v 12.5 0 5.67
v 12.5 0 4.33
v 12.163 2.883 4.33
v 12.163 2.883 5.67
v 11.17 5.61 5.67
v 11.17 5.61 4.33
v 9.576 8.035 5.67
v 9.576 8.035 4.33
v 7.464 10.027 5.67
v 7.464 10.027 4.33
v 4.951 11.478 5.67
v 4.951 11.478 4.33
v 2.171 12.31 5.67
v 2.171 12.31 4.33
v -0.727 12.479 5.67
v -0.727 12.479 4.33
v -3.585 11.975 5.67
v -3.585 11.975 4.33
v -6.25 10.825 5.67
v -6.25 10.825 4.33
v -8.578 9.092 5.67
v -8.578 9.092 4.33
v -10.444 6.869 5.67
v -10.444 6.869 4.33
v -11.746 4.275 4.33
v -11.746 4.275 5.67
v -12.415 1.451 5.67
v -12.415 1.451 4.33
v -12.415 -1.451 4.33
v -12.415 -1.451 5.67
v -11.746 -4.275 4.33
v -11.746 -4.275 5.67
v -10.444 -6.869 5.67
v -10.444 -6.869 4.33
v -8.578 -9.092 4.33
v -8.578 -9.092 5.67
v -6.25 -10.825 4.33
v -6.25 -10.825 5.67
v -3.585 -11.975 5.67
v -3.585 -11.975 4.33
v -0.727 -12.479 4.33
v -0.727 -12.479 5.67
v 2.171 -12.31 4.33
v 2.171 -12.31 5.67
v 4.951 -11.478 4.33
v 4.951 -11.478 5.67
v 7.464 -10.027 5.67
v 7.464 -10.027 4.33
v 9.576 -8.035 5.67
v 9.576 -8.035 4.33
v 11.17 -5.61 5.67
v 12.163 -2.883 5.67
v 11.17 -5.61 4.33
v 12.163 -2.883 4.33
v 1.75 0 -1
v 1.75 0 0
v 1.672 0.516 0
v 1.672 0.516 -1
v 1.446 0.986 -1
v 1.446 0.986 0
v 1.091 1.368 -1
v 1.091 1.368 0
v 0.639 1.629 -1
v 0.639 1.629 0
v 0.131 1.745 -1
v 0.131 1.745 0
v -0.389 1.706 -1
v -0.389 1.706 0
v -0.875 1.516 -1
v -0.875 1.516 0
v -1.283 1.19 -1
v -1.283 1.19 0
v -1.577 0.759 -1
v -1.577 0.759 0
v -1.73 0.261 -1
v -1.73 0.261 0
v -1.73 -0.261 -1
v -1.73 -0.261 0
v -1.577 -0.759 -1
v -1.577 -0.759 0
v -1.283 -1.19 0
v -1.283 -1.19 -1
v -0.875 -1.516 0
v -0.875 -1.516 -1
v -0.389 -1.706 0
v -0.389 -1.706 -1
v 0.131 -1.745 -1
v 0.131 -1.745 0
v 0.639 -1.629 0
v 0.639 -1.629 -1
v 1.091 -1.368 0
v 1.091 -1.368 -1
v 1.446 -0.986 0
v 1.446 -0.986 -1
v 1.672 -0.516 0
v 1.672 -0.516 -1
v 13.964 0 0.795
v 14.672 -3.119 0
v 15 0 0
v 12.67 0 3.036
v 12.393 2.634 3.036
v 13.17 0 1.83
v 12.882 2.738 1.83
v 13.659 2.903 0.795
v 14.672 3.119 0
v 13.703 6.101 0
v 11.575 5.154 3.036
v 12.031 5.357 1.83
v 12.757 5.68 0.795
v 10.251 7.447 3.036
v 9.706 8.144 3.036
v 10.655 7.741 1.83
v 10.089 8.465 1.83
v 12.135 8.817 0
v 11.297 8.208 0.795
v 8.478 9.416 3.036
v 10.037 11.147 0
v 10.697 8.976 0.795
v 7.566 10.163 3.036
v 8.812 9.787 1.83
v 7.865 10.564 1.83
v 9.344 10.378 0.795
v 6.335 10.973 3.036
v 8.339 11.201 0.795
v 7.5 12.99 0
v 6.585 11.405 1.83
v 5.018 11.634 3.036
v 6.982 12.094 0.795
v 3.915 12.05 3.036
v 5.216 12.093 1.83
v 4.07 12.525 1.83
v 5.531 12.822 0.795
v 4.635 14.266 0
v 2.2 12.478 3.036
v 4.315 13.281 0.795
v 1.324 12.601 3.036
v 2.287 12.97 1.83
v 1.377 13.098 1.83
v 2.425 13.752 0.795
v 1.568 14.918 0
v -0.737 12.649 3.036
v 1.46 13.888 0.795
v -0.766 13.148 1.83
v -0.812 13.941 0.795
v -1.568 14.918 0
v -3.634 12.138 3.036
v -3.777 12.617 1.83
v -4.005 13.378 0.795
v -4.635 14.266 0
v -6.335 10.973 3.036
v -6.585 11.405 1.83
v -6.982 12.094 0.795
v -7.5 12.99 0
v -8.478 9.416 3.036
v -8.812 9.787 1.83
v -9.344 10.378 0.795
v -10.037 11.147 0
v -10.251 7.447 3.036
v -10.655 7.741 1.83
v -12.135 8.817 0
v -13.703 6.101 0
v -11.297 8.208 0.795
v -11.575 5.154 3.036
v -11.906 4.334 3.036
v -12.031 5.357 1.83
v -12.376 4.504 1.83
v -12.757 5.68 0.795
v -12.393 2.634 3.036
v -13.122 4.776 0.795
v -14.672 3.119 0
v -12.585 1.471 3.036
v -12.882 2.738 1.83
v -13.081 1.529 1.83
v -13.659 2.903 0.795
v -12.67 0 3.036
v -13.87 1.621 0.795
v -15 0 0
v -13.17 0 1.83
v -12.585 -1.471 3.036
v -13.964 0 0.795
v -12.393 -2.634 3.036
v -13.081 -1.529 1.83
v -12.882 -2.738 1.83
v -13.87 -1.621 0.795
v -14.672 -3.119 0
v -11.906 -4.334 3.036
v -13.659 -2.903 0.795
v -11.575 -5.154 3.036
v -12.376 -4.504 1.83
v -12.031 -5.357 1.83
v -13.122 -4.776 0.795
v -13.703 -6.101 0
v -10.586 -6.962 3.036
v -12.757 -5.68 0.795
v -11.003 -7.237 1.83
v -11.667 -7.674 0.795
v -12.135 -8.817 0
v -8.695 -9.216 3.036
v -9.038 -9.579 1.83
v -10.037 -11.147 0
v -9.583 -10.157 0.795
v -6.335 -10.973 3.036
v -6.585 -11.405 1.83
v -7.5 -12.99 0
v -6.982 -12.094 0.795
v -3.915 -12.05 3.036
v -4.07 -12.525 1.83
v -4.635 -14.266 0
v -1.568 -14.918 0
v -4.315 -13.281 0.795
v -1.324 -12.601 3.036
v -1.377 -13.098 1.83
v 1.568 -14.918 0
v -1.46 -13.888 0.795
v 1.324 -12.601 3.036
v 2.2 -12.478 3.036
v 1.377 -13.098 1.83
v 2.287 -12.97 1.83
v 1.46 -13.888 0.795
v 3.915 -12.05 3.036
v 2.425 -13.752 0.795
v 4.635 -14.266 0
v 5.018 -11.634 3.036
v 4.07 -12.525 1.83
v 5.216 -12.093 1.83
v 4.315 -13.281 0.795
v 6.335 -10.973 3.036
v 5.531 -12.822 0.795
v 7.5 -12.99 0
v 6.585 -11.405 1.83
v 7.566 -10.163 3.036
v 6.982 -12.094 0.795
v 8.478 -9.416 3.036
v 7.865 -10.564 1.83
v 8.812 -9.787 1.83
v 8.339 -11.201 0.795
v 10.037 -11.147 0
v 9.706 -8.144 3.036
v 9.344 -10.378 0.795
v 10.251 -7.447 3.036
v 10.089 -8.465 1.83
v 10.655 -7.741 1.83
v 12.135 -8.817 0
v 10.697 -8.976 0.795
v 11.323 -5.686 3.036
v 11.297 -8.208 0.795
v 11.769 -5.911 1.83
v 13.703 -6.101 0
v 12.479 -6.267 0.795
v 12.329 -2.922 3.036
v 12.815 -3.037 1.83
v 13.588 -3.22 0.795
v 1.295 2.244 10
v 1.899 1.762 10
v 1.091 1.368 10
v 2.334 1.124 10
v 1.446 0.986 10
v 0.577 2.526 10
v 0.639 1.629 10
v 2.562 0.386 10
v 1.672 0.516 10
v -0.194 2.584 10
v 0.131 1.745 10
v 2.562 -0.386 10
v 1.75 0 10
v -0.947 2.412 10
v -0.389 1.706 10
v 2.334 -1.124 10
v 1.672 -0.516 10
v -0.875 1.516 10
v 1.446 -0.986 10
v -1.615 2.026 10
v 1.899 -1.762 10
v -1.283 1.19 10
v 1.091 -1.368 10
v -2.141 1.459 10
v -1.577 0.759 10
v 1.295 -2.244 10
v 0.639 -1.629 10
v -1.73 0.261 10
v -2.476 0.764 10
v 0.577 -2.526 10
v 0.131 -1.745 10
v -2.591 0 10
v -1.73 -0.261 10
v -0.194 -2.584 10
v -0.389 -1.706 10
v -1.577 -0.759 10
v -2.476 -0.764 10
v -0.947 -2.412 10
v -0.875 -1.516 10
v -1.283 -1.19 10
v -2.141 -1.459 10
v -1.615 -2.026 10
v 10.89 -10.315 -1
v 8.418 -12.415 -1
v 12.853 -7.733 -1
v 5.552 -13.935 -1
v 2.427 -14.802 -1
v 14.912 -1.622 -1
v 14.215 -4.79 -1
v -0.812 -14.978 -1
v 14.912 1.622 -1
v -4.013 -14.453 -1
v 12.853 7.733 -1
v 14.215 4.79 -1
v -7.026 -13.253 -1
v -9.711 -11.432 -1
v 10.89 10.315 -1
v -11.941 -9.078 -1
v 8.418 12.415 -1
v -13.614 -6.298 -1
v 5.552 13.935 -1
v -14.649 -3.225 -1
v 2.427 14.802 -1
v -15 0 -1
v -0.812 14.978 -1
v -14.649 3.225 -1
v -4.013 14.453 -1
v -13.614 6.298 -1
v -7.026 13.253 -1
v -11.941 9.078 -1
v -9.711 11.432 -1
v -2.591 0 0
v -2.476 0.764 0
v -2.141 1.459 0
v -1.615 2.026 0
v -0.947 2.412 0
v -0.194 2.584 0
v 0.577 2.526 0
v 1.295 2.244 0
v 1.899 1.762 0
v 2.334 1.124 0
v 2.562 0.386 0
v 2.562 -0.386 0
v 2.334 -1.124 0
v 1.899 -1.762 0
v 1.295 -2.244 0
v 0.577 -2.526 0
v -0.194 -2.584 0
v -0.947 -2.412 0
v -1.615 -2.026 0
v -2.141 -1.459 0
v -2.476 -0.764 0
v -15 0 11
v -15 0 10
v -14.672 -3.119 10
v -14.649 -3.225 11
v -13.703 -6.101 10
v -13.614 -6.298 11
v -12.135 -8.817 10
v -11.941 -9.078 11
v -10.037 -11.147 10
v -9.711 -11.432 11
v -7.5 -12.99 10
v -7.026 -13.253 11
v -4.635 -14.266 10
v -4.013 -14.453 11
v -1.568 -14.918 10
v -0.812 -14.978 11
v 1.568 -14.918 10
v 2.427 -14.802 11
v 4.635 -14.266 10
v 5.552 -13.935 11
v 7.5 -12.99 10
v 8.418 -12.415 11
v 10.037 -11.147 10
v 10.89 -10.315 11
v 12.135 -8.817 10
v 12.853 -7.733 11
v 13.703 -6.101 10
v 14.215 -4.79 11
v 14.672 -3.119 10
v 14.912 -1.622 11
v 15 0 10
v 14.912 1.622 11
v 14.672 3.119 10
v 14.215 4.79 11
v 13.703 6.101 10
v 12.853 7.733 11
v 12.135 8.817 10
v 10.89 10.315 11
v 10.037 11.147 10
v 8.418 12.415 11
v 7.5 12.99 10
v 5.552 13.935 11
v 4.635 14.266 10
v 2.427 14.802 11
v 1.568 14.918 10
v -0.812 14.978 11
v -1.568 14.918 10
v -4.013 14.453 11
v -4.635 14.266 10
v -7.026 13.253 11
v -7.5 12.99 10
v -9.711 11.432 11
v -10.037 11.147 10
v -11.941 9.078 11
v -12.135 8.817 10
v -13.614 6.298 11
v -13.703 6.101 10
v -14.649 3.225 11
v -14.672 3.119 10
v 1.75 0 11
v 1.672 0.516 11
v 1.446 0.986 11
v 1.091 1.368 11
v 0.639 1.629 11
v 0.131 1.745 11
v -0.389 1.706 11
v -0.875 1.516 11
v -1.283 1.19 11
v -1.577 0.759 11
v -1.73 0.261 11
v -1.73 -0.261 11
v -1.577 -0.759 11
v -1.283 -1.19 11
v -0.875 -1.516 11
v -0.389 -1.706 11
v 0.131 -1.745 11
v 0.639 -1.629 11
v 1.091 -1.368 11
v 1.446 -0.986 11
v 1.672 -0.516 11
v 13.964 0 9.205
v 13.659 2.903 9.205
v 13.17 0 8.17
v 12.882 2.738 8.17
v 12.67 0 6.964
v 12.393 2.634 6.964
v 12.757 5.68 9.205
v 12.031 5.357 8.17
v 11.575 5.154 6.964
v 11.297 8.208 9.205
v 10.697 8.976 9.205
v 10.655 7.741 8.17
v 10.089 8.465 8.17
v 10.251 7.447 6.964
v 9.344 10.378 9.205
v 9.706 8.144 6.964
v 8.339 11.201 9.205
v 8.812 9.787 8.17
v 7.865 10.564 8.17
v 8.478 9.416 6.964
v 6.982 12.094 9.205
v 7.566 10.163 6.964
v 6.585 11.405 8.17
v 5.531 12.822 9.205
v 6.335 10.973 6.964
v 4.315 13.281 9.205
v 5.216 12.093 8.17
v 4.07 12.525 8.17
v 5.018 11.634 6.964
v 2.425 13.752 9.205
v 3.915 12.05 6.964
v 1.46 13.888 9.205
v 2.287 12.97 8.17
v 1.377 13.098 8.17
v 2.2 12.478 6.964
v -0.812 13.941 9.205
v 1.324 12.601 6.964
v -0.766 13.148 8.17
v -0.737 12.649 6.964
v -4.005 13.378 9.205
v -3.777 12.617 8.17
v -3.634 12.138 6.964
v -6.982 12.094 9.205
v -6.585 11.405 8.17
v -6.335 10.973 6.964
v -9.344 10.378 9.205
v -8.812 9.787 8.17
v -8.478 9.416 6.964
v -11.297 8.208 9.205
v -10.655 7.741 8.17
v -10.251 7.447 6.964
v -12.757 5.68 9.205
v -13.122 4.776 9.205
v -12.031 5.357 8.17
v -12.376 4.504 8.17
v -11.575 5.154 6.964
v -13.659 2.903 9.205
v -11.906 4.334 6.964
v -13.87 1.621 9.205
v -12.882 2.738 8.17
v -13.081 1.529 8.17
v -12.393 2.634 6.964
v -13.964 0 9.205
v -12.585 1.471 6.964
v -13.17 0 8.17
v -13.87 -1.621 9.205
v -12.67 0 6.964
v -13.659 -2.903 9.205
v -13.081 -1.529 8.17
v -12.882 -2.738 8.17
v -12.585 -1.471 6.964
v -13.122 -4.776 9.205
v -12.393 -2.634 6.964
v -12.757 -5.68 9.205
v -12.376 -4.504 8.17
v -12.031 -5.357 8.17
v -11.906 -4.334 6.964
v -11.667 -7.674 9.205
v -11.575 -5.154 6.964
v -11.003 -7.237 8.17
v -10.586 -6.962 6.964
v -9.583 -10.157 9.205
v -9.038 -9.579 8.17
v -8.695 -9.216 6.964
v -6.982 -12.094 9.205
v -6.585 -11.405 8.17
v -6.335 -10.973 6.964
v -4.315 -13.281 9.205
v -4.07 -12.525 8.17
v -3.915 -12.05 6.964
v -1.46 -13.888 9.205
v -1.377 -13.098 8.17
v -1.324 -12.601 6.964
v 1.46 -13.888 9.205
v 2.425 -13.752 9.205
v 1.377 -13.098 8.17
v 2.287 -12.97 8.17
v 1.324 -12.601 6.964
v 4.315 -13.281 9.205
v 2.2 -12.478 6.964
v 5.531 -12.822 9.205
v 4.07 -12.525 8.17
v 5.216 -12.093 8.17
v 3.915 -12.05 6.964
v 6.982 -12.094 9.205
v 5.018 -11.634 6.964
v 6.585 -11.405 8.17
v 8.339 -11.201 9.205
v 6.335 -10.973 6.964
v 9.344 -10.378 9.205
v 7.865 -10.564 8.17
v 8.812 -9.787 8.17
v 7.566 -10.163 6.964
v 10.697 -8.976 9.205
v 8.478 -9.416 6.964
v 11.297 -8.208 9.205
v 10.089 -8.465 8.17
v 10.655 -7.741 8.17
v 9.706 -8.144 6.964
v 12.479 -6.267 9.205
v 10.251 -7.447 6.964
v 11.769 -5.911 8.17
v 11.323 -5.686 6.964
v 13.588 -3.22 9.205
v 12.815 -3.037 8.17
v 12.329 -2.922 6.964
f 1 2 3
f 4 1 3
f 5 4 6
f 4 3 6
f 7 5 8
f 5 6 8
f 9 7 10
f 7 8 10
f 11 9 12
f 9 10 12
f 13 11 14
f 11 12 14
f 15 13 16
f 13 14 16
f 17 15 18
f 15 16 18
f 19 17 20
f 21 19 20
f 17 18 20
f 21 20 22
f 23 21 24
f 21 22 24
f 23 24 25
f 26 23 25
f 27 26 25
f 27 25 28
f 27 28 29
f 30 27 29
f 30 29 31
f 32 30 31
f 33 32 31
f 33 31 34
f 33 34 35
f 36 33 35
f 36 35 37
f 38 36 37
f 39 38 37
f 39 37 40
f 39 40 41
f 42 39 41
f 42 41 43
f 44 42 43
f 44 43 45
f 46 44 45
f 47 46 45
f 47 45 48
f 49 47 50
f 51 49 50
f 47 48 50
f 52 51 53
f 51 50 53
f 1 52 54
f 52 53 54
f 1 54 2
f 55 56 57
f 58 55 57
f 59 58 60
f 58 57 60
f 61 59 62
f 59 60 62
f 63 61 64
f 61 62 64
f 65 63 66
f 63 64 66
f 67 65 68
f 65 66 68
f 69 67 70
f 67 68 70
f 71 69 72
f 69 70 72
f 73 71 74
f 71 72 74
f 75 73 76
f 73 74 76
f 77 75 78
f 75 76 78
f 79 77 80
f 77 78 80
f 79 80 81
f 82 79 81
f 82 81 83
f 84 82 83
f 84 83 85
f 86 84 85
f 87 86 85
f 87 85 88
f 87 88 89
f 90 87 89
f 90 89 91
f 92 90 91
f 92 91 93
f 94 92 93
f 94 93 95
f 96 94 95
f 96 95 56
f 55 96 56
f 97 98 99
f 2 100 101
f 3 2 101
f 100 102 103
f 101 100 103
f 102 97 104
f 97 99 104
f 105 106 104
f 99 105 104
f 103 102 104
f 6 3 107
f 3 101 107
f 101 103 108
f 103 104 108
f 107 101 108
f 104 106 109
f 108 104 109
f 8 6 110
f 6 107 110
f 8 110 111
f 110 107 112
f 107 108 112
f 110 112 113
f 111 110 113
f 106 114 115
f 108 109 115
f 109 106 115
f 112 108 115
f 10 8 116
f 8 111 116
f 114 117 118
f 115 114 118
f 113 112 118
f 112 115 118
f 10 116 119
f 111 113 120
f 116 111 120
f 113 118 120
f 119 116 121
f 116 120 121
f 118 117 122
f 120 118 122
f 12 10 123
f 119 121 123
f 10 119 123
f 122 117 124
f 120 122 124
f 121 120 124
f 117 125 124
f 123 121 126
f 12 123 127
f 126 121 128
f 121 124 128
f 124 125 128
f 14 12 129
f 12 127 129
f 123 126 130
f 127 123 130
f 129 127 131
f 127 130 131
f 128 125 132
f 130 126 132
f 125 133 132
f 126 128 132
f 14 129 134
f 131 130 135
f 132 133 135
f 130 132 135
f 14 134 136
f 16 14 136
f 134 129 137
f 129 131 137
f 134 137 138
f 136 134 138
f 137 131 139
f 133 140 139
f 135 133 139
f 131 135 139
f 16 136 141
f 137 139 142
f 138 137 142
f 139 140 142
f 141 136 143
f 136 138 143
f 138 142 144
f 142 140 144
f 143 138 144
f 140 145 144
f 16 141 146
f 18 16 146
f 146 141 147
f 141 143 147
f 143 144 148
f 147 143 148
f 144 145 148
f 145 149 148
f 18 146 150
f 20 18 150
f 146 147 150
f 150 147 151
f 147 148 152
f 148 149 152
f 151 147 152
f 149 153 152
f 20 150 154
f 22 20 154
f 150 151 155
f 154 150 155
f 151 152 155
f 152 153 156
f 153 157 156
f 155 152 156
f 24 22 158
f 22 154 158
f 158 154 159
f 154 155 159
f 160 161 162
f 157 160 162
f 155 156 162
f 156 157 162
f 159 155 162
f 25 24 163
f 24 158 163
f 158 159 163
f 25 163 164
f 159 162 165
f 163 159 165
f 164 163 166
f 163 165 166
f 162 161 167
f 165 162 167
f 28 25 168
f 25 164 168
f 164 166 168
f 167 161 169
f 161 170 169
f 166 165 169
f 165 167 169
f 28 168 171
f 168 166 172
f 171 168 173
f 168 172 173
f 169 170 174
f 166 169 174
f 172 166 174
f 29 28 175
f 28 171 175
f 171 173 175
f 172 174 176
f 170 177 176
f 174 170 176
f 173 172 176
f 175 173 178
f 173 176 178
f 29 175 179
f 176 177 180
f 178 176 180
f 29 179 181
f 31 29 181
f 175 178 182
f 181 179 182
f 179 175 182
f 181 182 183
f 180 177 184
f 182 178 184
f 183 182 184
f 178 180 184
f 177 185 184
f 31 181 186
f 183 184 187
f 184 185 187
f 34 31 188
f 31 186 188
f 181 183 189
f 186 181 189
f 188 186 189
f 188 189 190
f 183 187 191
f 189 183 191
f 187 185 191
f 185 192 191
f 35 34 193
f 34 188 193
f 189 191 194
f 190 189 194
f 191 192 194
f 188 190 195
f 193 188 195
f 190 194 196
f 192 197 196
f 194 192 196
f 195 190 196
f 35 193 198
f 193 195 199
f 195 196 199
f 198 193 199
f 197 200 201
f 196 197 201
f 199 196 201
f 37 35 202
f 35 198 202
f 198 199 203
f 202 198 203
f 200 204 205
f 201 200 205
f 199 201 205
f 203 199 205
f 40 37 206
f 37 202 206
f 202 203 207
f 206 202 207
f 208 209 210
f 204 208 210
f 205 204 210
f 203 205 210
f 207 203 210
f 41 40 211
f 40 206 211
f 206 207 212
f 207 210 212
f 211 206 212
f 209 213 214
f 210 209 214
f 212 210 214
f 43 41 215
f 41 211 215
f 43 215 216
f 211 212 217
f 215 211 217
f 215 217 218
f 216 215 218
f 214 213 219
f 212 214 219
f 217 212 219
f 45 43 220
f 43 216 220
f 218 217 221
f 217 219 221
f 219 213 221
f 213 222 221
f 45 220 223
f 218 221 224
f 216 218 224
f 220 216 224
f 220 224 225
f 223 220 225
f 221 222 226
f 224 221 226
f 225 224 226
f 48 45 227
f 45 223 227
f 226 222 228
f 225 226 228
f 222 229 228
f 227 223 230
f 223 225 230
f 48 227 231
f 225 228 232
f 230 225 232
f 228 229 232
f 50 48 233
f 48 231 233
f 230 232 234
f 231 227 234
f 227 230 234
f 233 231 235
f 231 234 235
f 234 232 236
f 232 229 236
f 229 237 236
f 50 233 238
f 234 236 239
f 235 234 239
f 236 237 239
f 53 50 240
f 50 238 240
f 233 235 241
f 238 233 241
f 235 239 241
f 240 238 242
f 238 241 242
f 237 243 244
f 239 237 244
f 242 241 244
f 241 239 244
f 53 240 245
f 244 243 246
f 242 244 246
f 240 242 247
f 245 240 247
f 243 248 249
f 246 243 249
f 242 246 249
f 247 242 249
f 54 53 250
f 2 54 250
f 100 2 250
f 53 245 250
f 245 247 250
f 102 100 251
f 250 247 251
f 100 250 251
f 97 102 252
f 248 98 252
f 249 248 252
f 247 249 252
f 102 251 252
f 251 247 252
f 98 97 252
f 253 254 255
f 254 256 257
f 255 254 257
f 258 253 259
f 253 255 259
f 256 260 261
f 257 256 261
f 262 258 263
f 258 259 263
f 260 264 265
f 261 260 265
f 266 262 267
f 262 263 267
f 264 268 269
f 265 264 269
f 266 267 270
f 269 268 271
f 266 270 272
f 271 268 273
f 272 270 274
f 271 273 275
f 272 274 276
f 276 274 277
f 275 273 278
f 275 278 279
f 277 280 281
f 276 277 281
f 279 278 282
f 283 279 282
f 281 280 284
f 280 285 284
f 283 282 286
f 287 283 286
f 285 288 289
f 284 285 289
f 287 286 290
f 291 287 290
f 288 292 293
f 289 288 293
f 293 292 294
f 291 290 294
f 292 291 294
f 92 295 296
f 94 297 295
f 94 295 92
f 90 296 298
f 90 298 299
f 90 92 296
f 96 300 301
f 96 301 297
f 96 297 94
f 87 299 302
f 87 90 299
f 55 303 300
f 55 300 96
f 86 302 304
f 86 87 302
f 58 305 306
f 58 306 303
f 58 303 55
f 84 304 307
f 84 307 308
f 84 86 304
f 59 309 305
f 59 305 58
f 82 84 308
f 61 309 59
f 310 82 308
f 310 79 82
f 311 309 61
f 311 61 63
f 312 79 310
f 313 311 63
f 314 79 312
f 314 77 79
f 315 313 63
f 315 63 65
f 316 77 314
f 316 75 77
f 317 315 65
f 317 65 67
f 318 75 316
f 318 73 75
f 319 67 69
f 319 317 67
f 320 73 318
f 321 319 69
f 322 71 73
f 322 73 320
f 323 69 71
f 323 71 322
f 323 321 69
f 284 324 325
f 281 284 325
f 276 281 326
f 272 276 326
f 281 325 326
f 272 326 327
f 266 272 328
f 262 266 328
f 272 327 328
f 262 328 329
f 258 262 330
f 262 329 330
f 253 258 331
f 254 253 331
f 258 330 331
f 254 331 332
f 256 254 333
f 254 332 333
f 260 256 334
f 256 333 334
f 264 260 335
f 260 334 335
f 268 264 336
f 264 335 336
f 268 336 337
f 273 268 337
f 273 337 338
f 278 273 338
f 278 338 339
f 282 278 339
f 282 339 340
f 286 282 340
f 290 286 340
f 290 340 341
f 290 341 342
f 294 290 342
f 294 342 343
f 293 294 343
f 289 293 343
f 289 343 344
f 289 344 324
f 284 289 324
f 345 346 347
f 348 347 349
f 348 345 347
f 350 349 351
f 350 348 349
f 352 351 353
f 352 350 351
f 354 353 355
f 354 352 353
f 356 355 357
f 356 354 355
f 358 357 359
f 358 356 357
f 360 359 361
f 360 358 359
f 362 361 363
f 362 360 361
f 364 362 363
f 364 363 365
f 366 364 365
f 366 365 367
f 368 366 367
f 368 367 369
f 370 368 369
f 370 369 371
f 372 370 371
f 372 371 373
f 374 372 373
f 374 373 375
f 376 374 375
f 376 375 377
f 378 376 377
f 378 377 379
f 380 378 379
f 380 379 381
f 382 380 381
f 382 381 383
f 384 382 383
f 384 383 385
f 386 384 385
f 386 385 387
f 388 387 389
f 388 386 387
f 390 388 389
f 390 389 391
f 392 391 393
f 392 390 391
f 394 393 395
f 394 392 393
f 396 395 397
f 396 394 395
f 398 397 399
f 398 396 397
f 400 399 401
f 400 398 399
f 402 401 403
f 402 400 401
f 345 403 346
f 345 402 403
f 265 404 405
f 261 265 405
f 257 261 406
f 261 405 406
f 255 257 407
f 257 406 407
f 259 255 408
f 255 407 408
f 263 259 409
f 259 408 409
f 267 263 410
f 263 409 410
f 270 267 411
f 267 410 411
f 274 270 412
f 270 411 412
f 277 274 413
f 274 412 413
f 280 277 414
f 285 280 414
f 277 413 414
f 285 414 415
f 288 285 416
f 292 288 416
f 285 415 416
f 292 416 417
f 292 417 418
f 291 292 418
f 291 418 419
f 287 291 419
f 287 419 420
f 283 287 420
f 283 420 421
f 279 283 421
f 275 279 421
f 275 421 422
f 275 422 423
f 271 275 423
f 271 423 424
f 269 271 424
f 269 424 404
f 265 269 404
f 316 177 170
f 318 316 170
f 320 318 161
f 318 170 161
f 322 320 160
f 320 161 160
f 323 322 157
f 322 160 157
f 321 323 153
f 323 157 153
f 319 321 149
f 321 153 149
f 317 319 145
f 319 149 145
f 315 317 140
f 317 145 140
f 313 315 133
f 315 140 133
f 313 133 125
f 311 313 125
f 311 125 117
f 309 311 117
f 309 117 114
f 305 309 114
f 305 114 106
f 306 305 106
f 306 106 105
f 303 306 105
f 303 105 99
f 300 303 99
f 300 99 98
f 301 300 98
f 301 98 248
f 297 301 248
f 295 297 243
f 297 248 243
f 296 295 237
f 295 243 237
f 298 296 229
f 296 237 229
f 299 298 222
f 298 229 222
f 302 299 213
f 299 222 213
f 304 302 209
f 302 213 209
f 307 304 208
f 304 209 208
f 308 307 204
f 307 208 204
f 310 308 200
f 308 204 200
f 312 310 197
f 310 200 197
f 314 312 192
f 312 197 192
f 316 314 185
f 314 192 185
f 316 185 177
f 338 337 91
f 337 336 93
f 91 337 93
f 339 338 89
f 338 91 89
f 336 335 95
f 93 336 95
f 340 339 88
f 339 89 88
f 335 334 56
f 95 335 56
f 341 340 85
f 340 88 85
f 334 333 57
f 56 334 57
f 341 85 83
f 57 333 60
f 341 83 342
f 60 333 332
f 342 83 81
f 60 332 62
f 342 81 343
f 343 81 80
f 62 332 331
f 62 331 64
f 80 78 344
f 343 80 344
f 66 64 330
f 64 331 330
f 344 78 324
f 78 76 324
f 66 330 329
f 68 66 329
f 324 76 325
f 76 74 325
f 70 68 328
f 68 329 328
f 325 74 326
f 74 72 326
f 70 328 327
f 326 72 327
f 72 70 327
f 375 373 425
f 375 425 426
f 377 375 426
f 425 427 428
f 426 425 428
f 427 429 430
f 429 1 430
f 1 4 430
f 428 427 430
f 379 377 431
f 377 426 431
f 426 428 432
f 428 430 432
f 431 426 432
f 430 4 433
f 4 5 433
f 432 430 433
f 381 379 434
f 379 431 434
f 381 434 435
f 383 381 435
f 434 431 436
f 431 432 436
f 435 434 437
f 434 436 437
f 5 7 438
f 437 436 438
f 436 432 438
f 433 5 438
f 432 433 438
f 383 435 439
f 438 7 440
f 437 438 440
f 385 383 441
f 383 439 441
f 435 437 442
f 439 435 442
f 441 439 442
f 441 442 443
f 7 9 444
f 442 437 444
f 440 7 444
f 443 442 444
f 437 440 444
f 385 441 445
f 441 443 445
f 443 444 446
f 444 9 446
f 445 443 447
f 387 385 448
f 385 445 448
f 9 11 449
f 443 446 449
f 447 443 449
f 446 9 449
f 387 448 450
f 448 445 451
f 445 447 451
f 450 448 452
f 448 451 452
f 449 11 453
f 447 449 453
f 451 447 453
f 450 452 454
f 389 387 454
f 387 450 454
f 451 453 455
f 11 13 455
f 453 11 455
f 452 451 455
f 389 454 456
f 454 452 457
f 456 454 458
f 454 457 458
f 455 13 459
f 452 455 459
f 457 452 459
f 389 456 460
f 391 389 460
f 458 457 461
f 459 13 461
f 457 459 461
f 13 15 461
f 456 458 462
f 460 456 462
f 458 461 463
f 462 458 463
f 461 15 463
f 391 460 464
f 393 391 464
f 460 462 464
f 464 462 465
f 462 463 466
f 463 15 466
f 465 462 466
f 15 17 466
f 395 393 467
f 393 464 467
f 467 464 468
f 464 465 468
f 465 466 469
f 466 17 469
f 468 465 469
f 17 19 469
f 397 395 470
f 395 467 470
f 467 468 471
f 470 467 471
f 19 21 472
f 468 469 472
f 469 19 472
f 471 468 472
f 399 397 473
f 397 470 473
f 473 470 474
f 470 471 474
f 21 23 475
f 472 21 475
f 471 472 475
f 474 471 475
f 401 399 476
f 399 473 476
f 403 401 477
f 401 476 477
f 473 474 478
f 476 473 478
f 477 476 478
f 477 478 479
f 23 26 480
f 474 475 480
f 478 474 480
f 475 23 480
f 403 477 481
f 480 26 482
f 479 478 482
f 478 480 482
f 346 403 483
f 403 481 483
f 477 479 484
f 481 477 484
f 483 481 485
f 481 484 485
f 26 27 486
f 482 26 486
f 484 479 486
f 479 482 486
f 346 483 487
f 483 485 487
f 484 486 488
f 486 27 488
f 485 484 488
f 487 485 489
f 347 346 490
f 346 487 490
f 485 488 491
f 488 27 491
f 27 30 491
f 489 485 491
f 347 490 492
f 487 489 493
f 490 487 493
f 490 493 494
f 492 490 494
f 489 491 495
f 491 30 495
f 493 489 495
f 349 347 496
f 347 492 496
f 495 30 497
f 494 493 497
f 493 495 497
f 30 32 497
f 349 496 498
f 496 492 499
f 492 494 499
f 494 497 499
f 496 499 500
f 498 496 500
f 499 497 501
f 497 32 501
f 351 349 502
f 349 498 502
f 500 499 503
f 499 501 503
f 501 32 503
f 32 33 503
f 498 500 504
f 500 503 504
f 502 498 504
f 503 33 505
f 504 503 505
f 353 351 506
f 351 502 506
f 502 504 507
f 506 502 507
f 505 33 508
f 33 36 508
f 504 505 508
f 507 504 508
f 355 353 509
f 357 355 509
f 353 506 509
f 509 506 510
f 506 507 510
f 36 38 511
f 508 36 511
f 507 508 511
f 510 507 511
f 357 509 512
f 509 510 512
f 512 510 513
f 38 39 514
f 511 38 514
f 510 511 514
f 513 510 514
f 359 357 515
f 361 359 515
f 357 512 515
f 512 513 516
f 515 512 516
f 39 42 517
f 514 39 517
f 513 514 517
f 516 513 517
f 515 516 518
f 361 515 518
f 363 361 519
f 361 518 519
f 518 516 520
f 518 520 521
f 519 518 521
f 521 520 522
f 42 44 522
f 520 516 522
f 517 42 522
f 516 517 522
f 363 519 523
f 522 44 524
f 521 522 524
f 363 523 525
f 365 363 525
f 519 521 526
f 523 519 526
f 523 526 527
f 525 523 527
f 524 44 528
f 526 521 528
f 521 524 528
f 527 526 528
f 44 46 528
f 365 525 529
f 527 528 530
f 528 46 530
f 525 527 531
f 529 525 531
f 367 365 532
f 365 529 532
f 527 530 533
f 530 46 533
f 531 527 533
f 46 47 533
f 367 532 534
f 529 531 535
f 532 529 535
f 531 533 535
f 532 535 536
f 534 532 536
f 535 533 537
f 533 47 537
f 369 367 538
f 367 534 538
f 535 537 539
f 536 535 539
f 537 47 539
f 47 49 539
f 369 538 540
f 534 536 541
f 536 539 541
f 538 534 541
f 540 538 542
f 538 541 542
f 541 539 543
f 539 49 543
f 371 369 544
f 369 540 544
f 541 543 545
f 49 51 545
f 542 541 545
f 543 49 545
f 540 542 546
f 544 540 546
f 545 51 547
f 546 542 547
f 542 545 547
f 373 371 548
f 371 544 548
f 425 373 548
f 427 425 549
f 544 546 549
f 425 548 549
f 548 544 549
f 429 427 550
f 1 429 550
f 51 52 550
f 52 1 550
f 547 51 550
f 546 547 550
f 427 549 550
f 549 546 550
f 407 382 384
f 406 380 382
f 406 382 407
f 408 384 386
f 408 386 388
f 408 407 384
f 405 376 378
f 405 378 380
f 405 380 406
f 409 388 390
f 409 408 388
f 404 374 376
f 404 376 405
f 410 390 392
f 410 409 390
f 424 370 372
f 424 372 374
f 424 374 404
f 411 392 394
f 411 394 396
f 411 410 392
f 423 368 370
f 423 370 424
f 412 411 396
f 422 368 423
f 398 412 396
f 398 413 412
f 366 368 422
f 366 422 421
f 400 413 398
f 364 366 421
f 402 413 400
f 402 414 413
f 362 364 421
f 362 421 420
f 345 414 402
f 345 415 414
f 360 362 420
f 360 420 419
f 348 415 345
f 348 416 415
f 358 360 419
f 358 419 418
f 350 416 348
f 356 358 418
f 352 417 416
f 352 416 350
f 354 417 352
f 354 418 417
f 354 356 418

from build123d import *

# Parameters (mm, degrees)
SKETCH1_R                  = 12.5
BOSS_EXTRUDE1_DEPTH        = 10
F_6_0_204_DIAMETER_SLOT2_D = 5.1816
SKETCH10_R                 = 15
BOSS_EXTRUDE2_DEPTH        = 1
BOSS_EXTRUDE3_START        = 1
SKETCH12_R                 = 15
BOSS_EXTRUDE3_DEPTH        = 1
SKETCH13_R                 = 1.75
CUT_EXTRUDE1_DEPTH         = 25.372115214
FILLET4_R                  = 5
FILLET5_R                  = 5


with BuildPart() as part:
    # Sketch1 → Boss-Extrude1 (new body)
    with BuildSketch(Plane.XY):
        Circle(SKETCH1_R)
    extrude(amount=BOSS_EXTRUDE1_DEPTH)

    # #6 (0.204) Diameter Slot2 (through all)
    with Locations(Plane.XY.offset(10)):
        with Locations((0, 0)):
            Hole(F_6_0_204_DIAMETER_SLOT2_D / 2)

    # Sketch10 → Boss-Extrude2 (add)
    with BuildSketch(Plane(origin=(0, 0, 0), x_dir=(-1, 0, 0), z_dir=(0, 0, -1))):
        Circle(SKETCH10_R)
    extrude(amount=BOSS_EXTRUDE2_DEPTH)

    # Sketch12 → Boss-Extrude3 (add)
    with BuildSketch(Plane.XY.offset(10).offset(BOSS_EXTRUDE3_START)):
        with Locations(Location((0, 0, 0), (0, 0, 180))):
            Circle(SKETCH12_R)
    extrude(amount=-BOSS_EXTRUDE3_DEPTH)

    # Sketch13 → Cut-Extrude1 (cut, through all)
    with BuildSketch(Plane.XY.offset(11)):
        Circle(SKETCH13_R)
    extrude(amount=-CUT_EXTRUDE1_DEPTH, mode=Mode.SUBTRACT)

    # Fillet4
    # the kernel refuses this fillet: 5 mm, written as the material it adds along each edge
    with BuildSketch(Plane(origin=(0, 0, 10), x_dir=(1, 0, 0), z_dir=(0, -1, 0))) as fillet4_piece_1:
        with BuildLine():
            CenterArc((17.5, -4.330127019), FILLET4_R, 120, 60)
            Line((12.5, -4.330127019), (12.4, -4.330127019))
            Line((12.4, -4.330127019), (12.4, 0))
            Line((12.4, 0), (12.5, 0.1))
            ThreePointArc((12.5, 0.1), (13.75, 0.1), (14.95, 0.08660254))
            Line((14.95, 0.08660254), (15, 0))
        make_face()
    revolve(axis=Axis((0, 0, 10), (0, 0, 1)))

    # Fillet5
    # the kernel refuses this fillet: 5 mm, written as the material it adds along each edge
    with BuildSketch(Plane(origin=(0, 0, 0), x_dir=(1, 0, 0), z_dir=(0, -1, 0))) as fillet5_piece_1:
        with BuildLine():
            CenterArc((17.5, 4.330127019), FILLET5_R, 180, 60)
            Line((15, 0), (14.95, -0.08660254))
            ThreePointArc((14.95, -0.08660254), (13.75, -0.1), (12.5, -0.1))
            Line((12.5, -0.1), (12.4, 0))
            Line((12.4, 0), (12.4, 4.330127019))
            Line((12.4, 4.330127019), (12.5, 4.330127019))
        make_face()
    revolve(axis=Axis((0, 0, 0), (0, 0, 1)))


solid = part.part
